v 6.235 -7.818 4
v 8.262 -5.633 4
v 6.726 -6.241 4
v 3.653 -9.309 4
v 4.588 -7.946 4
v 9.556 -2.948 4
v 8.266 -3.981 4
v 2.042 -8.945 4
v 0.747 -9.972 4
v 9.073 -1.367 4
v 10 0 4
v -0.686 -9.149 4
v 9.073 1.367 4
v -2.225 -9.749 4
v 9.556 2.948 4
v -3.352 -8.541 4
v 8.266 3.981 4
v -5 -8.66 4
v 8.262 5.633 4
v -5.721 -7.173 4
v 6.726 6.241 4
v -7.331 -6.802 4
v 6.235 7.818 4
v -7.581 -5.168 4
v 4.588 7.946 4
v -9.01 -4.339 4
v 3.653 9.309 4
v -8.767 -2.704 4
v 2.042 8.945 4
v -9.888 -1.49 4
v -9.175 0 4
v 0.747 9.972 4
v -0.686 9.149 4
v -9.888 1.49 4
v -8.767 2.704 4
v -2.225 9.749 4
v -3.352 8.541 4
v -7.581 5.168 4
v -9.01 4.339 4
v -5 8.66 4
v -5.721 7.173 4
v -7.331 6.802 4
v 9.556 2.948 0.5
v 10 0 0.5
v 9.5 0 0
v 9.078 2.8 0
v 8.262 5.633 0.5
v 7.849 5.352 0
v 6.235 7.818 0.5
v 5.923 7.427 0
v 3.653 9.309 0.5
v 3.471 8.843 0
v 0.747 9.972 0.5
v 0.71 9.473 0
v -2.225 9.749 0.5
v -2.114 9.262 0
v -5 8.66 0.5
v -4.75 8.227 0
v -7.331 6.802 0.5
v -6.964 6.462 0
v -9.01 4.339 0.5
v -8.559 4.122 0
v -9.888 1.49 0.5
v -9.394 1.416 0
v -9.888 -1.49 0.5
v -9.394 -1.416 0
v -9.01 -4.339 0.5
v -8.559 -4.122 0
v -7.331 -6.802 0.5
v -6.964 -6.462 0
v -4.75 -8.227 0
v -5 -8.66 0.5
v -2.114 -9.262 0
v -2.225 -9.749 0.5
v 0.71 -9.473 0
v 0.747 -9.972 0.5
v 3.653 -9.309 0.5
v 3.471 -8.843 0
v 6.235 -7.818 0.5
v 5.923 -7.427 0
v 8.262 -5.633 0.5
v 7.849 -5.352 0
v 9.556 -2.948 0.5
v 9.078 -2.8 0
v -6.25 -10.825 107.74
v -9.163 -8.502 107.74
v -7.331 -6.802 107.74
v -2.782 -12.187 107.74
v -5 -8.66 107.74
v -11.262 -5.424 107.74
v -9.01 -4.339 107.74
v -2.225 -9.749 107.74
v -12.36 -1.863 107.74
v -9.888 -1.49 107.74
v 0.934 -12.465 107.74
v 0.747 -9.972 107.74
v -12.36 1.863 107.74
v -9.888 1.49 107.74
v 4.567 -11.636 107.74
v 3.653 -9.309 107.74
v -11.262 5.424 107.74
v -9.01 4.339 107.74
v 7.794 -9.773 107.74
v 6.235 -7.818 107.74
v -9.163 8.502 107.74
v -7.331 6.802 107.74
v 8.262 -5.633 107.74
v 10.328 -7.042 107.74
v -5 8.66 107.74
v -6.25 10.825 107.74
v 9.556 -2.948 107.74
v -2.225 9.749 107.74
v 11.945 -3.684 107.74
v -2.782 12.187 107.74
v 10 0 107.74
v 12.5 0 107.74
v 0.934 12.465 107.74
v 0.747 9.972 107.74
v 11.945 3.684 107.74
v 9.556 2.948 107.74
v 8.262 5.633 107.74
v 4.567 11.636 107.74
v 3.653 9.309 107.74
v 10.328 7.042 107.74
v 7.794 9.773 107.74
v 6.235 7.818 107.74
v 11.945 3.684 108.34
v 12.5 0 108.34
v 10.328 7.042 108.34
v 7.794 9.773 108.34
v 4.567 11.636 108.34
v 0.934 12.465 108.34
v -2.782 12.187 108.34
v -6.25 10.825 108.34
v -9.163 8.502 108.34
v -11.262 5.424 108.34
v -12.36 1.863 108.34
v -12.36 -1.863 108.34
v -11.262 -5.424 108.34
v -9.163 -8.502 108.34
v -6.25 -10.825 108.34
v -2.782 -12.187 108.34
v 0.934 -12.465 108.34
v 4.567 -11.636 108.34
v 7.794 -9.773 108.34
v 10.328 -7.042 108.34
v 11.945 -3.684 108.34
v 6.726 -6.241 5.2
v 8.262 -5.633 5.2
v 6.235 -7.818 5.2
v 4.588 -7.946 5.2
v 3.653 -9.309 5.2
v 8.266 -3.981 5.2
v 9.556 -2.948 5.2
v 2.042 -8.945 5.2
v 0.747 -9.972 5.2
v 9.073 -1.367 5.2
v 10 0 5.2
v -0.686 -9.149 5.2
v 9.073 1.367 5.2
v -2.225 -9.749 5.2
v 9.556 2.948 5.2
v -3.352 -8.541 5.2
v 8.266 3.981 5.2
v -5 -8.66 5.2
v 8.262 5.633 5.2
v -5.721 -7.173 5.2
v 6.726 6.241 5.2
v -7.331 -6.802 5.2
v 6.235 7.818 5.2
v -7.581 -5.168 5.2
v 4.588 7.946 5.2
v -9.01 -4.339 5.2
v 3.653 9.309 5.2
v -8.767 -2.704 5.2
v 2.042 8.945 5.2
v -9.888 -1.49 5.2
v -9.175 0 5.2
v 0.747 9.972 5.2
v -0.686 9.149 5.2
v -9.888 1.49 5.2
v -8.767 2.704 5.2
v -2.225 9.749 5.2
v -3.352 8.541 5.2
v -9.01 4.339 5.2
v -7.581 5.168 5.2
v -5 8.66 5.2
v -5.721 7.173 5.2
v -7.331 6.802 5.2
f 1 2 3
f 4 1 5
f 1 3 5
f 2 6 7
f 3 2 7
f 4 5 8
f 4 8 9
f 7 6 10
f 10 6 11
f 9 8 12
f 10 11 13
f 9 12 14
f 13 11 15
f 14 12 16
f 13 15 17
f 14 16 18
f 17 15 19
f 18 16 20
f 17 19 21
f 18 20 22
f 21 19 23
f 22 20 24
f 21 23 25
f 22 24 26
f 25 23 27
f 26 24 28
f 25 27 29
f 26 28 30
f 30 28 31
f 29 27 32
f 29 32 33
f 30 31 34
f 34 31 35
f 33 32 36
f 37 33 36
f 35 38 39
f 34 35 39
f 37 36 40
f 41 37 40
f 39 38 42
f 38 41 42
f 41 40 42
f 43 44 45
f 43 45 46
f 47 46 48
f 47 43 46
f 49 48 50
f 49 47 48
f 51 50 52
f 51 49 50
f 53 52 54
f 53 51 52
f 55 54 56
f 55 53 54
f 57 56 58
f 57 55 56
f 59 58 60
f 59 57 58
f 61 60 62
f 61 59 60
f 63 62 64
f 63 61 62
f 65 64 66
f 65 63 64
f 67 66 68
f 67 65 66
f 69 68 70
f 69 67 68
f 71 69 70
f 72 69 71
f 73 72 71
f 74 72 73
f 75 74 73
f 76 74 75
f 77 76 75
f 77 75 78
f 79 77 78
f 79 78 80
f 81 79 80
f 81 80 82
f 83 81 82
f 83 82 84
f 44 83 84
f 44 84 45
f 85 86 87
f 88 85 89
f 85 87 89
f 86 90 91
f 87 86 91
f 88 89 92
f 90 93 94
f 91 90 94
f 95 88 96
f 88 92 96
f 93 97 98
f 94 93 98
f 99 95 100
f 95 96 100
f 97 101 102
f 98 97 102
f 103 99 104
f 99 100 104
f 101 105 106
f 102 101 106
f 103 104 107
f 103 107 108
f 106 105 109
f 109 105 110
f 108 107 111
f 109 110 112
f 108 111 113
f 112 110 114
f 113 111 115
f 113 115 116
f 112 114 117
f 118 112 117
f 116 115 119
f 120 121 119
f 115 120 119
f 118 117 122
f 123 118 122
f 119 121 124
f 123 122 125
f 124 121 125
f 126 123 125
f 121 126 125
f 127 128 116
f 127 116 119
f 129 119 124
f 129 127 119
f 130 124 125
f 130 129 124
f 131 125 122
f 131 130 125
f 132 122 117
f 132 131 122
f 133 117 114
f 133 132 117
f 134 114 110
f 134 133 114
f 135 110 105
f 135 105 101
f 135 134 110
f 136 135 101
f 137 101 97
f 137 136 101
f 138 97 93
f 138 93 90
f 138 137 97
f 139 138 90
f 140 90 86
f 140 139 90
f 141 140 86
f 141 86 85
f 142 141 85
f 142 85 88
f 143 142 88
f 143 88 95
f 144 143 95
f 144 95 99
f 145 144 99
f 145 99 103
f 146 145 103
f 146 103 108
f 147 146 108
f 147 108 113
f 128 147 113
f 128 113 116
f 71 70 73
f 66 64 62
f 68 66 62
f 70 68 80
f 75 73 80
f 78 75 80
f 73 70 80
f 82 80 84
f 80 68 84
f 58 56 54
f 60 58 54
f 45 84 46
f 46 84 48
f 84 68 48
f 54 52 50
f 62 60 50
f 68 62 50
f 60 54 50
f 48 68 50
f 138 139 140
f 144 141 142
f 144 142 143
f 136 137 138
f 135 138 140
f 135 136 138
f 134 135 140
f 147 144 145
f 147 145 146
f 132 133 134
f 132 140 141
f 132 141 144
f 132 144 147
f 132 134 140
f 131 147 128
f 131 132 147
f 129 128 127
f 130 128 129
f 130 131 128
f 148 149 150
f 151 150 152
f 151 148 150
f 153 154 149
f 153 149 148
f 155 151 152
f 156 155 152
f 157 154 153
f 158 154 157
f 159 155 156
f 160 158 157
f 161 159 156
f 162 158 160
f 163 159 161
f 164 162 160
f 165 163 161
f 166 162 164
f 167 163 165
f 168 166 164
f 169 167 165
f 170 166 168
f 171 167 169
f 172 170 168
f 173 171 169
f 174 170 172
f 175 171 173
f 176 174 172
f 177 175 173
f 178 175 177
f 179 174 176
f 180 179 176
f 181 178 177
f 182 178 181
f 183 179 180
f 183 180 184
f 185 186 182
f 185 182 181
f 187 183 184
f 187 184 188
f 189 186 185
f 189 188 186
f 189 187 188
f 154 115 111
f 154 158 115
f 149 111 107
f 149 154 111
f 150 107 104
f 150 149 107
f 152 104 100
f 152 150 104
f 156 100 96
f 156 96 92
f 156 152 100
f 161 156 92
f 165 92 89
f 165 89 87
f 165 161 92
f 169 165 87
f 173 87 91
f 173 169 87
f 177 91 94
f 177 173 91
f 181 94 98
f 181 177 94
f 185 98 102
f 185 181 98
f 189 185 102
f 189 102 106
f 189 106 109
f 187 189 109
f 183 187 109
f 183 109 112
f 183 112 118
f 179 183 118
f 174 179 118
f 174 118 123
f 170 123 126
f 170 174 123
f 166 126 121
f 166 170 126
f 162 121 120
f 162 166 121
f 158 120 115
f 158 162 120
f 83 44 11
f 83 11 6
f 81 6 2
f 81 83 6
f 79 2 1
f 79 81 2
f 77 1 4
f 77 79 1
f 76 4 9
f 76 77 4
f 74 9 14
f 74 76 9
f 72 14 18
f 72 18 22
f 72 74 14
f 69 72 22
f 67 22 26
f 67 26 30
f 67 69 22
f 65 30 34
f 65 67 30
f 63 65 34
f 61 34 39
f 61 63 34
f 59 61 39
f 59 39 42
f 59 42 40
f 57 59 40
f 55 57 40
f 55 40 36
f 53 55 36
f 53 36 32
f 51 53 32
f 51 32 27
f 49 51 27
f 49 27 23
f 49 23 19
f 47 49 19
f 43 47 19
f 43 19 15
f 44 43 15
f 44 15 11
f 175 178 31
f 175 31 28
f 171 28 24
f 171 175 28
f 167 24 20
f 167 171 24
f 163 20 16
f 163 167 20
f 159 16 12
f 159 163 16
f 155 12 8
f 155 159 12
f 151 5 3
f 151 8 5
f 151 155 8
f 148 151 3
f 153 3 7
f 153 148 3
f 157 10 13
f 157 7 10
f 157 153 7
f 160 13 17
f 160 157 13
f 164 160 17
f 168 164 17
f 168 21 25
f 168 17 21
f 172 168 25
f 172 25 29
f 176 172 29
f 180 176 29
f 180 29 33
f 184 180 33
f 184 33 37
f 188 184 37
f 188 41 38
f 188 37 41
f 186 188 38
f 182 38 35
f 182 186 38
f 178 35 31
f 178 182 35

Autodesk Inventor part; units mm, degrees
ref_plane "YZ Plane" through (0, 0, 0) normal (1, 0, 0) x (0, 1, 0)
ref_plane "XZ Plane" through (0, 0, 0) normal (0, 1, 0) x (-1, 0, 0)
ref_plane "XY Plane" through (0, 0, 0) normal (0, 0, 1) x (1, 0, 0)
sketch "草图1" plane through (0, 0, 0) normal (0, 0, 1) x (1, 0, 0)
  circle A0 centre (0, 0) radius 10
  dimension "d0" = 20
extrude "拉伸1" add sketch "草图1" along normal blind 108.34
sketch "草图2" plane through (0, 0, 108.34) normal (0, 0, 1) x (1, 0, 0)
  circle A0 centre (0, 0) radius 12.5
  dimension "d3" = 25
extrude "拉伸2" add sketch "草图2" against normal blind 0.6
sketch "草图3" plane through (0, 0, 0) normal (0, 1, 0) x (-1, 0, 0)
  line L0 (15.328, 4) -> (9.175, 4)
  line L1 (9.175, 4) -> (9.175, 5.2)
  line L2 (9.175, 5.2) -> (15.328, 5.2)
  line L3 (15.328, 5.2) -> (15.328, 4)
  line L4 (0, 0) -> (0, -10.7224)
  line L5 (-10, 0) -> (10, 0) projected
  dimension "d6" = 10.7224
  dimension "d7" = 1.2
  dimension "d8" = 4
  dimension "d9" = 9.175
  dimension "d10" = 6.153
revolve "旋转1" cut sketch "草图3" angle 360 about axis through (0, 0, 0) along (0, 0, -1)
chamfer "倒角1" distance 0.5 angle 45 1 edges at (-10, 0, 0)
properties part number "皮带轮轴"
